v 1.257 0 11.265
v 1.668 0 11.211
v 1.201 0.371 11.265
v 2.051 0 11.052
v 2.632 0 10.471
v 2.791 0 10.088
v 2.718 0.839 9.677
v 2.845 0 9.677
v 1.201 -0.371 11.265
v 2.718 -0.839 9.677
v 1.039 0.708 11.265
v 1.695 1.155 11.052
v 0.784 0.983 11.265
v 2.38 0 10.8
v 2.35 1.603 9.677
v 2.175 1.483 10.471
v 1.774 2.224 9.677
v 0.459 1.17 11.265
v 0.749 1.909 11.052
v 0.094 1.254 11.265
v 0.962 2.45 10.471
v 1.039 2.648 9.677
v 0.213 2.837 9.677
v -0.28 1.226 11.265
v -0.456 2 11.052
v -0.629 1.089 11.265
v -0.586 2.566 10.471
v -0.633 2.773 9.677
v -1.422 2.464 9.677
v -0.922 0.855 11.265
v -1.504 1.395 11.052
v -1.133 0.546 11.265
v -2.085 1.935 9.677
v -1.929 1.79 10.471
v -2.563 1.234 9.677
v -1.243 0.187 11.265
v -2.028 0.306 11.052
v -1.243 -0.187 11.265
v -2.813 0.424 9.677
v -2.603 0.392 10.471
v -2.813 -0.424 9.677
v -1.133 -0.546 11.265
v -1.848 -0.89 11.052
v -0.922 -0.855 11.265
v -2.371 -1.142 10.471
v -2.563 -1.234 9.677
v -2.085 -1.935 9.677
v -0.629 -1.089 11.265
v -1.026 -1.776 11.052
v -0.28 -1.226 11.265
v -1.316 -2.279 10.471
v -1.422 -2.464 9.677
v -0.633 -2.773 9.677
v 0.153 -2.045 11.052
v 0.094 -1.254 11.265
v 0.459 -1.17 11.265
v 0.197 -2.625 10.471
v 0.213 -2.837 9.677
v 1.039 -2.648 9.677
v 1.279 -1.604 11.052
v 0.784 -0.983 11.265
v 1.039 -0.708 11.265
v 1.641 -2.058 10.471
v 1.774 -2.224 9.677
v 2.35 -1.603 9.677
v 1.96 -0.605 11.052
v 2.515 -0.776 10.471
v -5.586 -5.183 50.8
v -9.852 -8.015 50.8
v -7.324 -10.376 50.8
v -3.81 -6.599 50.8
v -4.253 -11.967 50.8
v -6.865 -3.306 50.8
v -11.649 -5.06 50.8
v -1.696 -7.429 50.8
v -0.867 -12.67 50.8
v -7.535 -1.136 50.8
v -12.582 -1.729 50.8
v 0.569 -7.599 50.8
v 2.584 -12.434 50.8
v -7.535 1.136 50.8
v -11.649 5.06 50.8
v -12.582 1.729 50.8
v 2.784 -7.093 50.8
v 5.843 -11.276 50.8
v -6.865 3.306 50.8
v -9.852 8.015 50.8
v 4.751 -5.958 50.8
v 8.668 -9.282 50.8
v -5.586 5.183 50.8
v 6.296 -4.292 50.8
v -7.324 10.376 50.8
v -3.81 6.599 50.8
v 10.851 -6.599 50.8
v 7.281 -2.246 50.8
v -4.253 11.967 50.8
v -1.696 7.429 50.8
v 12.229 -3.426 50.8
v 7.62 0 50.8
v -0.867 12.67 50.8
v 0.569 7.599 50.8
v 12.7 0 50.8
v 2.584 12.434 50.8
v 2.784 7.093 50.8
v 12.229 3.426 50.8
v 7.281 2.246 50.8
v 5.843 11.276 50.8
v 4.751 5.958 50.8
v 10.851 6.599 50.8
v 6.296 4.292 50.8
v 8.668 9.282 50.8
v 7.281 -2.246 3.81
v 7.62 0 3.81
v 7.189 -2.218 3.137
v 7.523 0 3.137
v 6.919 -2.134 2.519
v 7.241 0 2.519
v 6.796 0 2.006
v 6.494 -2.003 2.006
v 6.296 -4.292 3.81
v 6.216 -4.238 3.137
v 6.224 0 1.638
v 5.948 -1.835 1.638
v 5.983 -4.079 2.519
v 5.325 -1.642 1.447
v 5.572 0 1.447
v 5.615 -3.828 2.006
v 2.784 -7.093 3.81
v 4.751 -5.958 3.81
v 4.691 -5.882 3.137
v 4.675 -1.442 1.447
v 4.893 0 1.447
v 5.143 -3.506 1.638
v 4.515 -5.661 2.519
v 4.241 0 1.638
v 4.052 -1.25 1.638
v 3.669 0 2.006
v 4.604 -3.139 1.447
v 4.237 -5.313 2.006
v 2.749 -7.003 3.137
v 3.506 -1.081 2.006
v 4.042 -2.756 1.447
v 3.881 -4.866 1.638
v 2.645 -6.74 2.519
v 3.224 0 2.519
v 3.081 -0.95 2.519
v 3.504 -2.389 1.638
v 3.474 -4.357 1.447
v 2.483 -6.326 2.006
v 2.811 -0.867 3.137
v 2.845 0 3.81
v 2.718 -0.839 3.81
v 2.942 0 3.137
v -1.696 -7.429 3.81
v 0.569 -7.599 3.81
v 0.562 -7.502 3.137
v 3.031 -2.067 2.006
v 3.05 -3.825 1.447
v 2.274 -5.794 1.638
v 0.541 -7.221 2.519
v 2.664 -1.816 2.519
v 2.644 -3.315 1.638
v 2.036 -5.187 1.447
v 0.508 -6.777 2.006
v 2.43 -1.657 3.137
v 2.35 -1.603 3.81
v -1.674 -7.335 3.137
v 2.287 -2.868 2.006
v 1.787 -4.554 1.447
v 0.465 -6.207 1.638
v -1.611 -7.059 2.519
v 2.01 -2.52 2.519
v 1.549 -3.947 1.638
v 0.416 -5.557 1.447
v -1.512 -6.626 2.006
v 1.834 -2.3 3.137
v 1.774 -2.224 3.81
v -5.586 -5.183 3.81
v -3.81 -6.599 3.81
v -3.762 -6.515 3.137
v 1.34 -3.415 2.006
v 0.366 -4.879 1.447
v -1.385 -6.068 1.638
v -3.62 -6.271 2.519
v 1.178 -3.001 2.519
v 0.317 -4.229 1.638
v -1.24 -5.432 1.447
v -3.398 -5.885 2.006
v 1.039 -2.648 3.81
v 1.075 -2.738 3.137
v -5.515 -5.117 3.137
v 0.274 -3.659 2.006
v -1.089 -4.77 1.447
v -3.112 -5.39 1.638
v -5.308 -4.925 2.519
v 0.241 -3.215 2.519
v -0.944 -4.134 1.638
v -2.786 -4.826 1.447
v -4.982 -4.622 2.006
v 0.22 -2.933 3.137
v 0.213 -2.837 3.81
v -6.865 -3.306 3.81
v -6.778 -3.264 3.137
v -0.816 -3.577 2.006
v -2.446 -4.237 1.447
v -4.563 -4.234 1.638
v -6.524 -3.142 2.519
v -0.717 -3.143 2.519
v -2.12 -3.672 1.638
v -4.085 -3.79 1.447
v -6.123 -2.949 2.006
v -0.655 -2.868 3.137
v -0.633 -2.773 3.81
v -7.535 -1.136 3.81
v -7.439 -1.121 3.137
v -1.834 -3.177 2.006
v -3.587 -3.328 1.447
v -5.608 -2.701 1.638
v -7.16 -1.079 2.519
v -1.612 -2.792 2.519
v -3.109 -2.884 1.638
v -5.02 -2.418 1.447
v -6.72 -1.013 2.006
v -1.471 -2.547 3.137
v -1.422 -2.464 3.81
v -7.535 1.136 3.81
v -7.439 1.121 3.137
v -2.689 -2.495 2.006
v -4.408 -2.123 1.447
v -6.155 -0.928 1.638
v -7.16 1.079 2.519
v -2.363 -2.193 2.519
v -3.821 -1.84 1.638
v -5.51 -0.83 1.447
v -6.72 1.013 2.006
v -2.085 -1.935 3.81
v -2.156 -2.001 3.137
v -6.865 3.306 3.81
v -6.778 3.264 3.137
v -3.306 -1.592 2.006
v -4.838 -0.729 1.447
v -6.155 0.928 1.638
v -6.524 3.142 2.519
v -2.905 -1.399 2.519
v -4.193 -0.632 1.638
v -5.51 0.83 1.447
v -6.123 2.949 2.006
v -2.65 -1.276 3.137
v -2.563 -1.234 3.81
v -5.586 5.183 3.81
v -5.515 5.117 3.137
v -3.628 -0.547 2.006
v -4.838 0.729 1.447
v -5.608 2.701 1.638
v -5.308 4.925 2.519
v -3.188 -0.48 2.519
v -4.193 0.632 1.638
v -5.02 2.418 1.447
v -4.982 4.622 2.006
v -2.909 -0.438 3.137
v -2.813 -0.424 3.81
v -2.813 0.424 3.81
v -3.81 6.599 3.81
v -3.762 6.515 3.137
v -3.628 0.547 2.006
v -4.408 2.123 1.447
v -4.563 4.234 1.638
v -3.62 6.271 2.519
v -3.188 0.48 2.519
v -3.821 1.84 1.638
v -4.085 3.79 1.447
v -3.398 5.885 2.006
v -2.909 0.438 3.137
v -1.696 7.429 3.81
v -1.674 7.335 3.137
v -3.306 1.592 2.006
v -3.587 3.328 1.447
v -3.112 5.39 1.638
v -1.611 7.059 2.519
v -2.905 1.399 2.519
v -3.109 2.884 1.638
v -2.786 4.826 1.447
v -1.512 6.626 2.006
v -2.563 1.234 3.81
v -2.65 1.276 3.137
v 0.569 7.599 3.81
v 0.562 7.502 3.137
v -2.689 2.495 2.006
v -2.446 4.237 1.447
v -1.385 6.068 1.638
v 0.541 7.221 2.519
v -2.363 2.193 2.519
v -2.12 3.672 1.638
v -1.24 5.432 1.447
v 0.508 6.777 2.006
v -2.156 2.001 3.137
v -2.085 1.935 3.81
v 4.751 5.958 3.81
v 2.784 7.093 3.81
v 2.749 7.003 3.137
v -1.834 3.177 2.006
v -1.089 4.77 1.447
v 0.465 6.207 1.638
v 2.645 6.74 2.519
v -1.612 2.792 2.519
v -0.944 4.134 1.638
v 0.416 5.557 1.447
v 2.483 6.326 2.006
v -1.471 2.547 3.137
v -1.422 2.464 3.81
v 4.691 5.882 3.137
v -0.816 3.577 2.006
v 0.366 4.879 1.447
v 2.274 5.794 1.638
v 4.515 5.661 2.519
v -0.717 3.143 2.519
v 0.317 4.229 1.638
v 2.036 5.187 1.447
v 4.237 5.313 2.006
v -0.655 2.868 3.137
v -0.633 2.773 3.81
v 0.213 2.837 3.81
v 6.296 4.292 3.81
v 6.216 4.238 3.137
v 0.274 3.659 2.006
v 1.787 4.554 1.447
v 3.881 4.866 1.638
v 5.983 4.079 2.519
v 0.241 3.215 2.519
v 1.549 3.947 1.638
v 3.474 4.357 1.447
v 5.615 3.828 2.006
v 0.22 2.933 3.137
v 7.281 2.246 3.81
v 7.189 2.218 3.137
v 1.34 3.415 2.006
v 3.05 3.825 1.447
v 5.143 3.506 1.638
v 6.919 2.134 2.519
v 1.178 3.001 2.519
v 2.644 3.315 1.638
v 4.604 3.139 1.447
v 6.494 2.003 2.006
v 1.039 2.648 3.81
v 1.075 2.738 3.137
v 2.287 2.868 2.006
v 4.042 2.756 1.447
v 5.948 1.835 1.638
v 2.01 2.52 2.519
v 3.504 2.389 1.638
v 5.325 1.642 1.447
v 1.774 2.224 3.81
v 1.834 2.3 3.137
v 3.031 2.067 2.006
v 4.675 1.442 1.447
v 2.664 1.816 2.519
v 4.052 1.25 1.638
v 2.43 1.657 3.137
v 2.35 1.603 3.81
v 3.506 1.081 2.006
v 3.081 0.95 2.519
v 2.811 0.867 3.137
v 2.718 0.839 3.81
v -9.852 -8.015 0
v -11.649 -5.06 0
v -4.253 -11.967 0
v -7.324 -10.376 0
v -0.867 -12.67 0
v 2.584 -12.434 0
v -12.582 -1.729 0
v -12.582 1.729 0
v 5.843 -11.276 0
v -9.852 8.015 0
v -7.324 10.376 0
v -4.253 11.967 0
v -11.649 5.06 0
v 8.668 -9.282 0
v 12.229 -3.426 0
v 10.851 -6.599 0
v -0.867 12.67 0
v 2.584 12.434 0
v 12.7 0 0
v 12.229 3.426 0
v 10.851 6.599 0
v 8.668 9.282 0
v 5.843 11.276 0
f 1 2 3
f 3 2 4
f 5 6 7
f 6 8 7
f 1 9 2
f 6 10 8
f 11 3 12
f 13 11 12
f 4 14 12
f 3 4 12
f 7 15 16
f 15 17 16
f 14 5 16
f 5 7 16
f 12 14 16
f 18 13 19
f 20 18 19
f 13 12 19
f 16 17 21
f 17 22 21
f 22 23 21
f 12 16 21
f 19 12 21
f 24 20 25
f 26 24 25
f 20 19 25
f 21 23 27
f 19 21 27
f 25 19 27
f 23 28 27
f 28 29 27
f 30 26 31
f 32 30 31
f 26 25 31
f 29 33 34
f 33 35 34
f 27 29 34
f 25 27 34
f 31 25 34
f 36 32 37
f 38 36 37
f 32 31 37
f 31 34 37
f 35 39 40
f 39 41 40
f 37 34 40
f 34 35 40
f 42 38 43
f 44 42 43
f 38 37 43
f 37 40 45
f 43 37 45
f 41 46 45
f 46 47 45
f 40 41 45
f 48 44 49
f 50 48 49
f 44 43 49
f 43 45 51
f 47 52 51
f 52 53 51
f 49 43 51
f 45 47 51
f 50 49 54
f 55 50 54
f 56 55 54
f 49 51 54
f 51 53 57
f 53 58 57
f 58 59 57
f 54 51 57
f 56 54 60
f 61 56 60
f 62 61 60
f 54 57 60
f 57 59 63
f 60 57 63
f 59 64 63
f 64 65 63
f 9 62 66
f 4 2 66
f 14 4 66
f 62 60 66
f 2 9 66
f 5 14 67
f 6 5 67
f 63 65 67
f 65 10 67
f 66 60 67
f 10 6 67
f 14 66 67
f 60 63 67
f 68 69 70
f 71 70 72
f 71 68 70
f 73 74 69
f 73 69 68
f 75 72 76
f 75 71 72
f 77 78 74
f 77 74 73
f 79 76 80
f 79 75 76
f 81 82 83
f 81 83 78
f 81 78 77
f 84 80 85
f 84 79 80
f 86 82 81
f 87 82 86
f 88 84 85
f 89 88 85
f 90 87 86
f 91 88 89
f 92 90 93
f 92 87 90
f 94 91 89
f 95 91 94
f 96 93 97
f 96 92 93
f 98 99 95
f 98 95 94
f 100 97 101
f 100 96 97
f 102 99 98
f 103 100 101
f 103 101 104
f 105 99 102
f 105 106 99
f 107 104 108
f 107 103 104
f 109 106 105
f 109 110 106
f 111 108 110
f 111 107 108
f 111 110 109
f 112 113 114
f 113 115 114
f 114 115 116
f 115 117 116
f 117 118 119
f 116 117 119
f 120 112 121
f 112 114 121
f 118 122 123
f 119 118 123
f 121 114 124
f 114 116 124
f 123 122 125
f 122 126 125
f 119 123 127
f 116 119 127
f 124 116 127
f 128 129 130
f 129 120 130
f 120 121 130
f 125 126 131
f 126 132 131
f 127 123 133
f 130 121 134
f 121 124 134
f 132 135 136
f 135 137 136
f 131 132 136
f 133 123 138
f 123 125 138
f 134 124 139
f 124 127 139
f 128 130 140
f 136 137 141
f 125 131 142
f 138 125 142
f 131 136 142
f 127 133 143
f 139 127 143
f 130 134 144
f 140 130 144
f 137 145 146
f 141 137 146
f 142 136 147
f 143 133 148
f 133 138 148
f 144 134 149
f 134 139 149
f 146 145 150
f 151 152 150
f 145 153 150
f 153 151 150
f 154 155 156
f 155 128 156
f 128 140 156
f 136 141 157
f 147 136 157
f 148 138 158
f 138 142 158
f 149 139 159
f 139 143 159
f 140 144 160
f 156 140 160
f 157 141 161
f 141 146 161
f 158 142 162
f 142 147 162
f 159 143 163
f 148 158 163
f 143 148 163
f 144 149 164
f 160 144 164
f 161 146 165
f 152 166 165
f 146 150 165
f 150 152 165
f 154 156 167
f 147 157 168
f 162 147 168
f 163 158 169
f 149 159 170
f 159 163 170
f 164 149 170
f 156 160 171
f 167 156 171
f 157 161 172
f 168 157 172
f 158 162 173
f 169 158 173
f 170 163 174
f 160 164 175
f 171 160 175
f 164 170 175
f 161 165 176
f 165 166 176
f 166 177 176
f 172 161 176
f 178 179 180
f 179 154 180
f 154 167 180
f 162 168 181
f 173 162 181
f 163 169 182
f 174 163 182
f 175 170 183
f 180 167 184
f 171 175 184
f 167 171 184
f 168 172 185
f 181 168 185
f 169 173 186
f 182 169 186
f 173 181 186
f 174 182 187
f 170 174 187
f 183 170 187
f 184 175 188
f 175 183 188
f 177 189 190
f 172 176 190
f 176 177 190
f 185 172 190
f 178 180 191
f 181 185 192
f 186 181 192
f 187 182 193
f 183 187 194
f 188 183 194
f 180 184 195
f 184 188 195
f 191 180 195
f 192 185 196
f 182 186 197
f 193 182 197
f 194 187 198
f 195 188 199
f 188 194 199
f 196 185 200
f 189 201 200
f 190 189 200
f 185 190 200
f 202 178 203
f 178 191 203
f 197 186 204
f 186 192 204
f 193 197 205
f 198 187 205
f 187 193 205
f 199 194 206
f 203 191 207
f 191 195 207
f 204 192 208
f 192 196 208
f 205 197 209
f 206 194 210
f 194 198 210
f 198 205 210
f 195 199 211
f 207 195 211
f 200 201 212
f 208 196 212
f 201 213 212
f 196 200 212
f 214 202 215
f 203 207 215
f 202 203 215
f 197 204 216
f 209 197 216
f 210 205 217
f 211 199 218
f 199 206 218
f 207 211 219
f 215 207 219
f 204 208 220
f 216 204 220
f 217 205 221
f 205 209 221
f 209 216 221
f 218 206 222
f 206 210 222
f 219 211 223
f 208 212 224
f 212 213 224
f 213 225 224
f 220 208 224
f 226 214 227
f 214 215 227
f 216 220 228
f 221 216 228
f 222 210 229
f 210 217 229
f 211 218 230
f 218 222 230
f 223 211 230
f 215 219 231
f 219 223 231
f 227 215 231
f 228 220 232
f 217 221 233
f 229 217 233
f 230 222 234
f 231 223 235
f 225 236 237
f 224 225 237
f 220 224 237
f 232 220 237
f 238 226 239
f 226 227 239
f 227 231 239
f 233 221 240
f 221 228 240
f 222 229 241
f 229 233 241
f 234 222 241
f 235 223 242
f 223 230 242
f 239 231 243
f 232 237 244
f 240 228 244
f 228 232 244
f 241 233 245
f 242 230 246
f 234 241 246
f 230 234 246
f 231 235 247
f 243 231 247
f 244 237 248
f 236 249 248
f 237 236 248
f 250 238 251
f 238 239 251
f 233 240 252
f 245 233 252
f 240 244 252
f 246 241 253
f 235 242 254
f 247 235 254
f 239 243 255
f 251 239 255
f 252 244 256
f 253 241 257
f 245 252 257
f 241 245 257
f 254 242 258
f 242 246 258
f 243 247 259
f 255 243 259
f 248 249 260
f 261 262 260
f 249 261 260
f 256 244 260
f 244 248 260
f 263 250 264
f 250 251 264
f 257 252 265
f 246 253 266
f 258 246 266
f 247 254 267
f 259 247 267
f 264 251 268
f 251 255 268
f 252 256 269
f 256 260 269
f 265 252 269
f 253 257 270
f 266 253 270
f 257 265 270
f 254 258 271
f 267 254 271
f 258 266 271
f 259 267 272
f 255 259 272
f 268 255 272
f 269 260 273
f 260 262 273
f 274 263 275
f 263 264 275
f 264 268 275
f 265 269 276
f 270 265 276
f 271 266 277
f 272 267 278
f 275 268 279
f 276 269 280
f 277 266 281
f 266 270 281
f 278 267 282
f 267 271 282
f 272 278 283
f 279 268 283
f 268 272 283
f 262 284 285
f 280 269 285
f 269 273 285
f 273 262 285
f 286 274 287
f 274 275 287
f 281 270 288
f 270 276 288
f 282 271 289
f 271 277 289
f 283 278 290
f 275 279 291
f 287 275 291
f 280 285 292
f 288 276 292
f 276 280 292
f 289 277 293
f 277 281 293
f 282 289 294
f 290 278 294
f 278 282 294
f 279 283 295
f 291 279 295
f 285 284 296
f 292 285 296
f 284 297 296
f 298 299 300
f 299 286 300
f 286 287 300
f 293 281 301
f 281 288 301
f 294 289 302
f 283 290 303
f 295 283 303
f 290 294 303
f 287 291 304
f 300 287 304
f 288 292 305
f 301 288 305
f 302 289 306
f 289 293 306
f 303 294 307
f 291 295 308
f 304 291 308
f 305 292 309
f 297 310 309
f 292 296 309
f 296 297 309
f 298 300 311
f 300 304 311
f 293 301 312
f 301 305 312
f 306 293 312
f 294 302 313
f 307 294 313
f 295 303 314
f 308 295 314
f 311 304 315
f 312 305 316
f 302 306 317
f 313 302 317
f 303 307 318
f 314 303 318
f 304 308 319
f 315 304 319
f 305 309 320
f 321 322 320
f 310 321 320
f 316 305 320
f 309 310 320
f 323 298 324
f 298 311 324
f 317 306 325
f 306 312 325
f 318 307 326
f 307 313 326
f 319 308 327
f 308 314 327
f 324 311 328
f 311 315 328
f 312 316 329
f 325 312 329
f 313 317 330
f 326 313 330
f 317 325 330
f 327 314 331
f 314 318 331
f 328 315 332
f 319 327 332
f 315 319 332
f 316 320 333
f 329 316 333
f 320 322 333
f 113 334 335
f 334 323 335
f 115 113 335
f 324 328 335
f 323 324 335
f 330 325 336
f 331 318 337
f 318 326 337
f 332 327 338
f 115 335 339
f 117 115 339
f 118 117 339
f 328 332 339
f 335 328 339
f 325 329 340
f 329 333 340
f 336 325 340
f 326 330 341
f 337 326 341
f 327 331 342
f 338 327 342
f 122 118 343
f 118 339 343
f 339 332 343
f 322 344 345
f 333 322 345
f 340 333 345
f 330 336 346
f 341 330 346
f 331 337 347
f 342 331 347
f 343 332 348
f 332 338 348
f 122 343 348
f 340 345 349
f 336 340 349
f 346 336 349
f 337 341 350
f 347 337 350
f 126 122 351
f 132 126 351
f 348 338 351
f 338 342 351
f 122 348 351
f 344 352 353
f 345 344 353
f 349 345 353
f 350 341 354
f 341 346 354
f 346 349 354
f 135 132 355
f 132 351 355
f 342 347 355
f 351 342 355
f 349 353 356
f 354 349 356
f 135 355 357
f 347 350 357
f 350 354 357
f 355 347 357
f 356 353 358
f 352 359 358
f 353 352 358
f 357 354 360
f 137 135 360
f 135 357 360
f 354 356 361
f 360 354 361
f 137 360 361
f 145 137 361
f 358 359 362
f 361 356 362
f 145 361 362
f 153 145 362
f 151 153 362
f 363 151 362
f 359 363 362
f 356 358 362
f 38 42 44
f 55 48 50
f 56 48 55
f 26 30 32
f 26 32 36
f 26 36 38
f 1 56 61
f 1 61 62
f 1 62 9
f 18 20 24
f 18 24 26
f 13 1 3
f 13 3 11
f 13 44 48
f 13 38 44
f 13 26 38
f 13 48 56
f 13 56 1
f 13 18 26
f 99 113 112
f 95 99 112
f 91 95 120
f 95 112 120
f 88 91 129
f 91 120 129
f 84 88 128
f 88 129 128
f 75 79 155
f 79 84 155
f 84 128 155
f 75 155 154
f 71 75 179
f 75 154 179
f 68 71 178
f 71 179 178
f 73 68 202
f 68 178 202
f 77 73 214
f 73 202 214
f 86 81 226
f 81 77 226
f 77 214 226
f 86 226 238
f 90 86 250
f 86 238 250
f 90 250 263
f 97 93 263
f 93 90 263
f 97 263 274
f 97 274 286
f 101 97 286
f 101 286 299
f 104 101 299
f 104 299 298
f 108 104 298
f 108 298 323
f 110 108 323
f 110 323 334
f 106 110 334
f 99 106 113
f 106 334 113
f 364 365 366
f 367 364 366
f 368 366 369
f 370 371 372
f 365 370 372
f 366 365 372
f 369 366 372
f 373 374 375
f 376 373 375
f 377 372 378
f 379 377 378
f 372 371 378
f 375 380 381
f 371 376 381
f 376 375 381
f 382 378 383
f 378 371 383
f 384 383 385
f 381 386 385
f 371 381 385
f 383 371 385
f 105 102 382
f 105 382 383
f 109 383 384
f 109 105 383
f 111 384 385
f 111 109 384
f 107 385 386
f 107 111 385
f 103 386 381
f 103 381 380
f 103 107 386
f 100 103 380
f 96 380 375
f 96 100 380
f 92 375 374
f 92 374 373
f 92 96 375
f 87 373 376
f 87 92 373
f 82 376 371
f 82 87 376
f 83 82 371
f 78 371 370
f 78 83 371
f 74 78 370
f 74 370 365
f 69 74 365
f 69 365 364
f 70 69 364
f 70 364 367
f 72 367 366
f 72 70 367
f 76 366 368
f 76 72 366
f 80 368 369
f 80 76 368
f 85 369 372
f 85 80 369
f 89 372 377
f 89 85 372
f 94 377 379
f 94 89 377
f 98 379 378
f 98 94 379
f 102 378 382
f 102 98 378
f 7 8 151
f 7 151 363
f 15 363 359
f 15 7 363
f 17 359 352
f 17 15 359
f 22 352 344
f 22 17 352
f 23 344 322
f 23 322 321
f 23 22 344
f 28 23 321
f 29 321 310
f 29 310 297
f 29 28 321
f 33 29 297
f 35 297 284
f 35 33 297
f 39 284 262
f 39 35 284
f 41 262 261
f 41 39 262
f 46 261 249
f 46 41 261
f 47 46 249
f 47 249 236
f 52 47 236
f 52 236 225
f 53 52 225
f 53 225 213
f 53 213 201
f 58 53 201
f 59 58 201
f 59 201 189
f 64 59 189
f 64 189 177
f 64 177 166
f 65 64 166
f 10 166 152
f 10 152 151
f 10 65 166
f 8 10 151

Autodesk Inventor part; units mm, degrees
ref_plane "YZ Plane" through (0, 0, 0) normal (1, 0, 0) x (0, 1, 0)
ref_plane "XZ Plane" through (0, 0, 0) normal (0, 1, 0) x (-1, 0, 0)
ref_plane "XY Plane" through (0, 0, 0) normal (0, 0, 1) x (1, 0, 0)
sketch "Sketch1" plane through (0, 0, 50.8) normal (0, 0, 1) x (1, 0, 0)
  circle A0 centre (0, 0) radius 12.7
sketch "Sketch2" plane through (0, 0, 0) normal (0, 1, 0) x (-1, 0, 0)
  line L0 (0, 50.8) -> (-7.62, 50.8)
  line L1 (-7.62, 50.8) -> (-7.62, 3.81)
  arc A0 (-7.62, 3.81) -> (-2.8448, 3.81) centre (-5.2324, 3.81) ccw
  line L2 (-2.8448, 3.81) -> (-2.8448, 9.6774)
  arc A1 (-1.2573, 11.2649) -> (-2.8448, 9.6774) centre (-1.2573, 9.6774) ccw
  line L3 (-1.2573, 11.2649) -> (0, 11.2649)
  line L4 (0, 11.2649) -> (0, 50.8)
  line L5 (0, -10.16) -> (0, 60.96) projected
extrude "Extrusion1" add sketch "Sketch1" against normal blind 50.8
revolve "Revolution1" cut sketch "Sketch2" angle 360 about axis through (0, 0, -10) along (0, 0, 1)
properties part number "coax_test"
